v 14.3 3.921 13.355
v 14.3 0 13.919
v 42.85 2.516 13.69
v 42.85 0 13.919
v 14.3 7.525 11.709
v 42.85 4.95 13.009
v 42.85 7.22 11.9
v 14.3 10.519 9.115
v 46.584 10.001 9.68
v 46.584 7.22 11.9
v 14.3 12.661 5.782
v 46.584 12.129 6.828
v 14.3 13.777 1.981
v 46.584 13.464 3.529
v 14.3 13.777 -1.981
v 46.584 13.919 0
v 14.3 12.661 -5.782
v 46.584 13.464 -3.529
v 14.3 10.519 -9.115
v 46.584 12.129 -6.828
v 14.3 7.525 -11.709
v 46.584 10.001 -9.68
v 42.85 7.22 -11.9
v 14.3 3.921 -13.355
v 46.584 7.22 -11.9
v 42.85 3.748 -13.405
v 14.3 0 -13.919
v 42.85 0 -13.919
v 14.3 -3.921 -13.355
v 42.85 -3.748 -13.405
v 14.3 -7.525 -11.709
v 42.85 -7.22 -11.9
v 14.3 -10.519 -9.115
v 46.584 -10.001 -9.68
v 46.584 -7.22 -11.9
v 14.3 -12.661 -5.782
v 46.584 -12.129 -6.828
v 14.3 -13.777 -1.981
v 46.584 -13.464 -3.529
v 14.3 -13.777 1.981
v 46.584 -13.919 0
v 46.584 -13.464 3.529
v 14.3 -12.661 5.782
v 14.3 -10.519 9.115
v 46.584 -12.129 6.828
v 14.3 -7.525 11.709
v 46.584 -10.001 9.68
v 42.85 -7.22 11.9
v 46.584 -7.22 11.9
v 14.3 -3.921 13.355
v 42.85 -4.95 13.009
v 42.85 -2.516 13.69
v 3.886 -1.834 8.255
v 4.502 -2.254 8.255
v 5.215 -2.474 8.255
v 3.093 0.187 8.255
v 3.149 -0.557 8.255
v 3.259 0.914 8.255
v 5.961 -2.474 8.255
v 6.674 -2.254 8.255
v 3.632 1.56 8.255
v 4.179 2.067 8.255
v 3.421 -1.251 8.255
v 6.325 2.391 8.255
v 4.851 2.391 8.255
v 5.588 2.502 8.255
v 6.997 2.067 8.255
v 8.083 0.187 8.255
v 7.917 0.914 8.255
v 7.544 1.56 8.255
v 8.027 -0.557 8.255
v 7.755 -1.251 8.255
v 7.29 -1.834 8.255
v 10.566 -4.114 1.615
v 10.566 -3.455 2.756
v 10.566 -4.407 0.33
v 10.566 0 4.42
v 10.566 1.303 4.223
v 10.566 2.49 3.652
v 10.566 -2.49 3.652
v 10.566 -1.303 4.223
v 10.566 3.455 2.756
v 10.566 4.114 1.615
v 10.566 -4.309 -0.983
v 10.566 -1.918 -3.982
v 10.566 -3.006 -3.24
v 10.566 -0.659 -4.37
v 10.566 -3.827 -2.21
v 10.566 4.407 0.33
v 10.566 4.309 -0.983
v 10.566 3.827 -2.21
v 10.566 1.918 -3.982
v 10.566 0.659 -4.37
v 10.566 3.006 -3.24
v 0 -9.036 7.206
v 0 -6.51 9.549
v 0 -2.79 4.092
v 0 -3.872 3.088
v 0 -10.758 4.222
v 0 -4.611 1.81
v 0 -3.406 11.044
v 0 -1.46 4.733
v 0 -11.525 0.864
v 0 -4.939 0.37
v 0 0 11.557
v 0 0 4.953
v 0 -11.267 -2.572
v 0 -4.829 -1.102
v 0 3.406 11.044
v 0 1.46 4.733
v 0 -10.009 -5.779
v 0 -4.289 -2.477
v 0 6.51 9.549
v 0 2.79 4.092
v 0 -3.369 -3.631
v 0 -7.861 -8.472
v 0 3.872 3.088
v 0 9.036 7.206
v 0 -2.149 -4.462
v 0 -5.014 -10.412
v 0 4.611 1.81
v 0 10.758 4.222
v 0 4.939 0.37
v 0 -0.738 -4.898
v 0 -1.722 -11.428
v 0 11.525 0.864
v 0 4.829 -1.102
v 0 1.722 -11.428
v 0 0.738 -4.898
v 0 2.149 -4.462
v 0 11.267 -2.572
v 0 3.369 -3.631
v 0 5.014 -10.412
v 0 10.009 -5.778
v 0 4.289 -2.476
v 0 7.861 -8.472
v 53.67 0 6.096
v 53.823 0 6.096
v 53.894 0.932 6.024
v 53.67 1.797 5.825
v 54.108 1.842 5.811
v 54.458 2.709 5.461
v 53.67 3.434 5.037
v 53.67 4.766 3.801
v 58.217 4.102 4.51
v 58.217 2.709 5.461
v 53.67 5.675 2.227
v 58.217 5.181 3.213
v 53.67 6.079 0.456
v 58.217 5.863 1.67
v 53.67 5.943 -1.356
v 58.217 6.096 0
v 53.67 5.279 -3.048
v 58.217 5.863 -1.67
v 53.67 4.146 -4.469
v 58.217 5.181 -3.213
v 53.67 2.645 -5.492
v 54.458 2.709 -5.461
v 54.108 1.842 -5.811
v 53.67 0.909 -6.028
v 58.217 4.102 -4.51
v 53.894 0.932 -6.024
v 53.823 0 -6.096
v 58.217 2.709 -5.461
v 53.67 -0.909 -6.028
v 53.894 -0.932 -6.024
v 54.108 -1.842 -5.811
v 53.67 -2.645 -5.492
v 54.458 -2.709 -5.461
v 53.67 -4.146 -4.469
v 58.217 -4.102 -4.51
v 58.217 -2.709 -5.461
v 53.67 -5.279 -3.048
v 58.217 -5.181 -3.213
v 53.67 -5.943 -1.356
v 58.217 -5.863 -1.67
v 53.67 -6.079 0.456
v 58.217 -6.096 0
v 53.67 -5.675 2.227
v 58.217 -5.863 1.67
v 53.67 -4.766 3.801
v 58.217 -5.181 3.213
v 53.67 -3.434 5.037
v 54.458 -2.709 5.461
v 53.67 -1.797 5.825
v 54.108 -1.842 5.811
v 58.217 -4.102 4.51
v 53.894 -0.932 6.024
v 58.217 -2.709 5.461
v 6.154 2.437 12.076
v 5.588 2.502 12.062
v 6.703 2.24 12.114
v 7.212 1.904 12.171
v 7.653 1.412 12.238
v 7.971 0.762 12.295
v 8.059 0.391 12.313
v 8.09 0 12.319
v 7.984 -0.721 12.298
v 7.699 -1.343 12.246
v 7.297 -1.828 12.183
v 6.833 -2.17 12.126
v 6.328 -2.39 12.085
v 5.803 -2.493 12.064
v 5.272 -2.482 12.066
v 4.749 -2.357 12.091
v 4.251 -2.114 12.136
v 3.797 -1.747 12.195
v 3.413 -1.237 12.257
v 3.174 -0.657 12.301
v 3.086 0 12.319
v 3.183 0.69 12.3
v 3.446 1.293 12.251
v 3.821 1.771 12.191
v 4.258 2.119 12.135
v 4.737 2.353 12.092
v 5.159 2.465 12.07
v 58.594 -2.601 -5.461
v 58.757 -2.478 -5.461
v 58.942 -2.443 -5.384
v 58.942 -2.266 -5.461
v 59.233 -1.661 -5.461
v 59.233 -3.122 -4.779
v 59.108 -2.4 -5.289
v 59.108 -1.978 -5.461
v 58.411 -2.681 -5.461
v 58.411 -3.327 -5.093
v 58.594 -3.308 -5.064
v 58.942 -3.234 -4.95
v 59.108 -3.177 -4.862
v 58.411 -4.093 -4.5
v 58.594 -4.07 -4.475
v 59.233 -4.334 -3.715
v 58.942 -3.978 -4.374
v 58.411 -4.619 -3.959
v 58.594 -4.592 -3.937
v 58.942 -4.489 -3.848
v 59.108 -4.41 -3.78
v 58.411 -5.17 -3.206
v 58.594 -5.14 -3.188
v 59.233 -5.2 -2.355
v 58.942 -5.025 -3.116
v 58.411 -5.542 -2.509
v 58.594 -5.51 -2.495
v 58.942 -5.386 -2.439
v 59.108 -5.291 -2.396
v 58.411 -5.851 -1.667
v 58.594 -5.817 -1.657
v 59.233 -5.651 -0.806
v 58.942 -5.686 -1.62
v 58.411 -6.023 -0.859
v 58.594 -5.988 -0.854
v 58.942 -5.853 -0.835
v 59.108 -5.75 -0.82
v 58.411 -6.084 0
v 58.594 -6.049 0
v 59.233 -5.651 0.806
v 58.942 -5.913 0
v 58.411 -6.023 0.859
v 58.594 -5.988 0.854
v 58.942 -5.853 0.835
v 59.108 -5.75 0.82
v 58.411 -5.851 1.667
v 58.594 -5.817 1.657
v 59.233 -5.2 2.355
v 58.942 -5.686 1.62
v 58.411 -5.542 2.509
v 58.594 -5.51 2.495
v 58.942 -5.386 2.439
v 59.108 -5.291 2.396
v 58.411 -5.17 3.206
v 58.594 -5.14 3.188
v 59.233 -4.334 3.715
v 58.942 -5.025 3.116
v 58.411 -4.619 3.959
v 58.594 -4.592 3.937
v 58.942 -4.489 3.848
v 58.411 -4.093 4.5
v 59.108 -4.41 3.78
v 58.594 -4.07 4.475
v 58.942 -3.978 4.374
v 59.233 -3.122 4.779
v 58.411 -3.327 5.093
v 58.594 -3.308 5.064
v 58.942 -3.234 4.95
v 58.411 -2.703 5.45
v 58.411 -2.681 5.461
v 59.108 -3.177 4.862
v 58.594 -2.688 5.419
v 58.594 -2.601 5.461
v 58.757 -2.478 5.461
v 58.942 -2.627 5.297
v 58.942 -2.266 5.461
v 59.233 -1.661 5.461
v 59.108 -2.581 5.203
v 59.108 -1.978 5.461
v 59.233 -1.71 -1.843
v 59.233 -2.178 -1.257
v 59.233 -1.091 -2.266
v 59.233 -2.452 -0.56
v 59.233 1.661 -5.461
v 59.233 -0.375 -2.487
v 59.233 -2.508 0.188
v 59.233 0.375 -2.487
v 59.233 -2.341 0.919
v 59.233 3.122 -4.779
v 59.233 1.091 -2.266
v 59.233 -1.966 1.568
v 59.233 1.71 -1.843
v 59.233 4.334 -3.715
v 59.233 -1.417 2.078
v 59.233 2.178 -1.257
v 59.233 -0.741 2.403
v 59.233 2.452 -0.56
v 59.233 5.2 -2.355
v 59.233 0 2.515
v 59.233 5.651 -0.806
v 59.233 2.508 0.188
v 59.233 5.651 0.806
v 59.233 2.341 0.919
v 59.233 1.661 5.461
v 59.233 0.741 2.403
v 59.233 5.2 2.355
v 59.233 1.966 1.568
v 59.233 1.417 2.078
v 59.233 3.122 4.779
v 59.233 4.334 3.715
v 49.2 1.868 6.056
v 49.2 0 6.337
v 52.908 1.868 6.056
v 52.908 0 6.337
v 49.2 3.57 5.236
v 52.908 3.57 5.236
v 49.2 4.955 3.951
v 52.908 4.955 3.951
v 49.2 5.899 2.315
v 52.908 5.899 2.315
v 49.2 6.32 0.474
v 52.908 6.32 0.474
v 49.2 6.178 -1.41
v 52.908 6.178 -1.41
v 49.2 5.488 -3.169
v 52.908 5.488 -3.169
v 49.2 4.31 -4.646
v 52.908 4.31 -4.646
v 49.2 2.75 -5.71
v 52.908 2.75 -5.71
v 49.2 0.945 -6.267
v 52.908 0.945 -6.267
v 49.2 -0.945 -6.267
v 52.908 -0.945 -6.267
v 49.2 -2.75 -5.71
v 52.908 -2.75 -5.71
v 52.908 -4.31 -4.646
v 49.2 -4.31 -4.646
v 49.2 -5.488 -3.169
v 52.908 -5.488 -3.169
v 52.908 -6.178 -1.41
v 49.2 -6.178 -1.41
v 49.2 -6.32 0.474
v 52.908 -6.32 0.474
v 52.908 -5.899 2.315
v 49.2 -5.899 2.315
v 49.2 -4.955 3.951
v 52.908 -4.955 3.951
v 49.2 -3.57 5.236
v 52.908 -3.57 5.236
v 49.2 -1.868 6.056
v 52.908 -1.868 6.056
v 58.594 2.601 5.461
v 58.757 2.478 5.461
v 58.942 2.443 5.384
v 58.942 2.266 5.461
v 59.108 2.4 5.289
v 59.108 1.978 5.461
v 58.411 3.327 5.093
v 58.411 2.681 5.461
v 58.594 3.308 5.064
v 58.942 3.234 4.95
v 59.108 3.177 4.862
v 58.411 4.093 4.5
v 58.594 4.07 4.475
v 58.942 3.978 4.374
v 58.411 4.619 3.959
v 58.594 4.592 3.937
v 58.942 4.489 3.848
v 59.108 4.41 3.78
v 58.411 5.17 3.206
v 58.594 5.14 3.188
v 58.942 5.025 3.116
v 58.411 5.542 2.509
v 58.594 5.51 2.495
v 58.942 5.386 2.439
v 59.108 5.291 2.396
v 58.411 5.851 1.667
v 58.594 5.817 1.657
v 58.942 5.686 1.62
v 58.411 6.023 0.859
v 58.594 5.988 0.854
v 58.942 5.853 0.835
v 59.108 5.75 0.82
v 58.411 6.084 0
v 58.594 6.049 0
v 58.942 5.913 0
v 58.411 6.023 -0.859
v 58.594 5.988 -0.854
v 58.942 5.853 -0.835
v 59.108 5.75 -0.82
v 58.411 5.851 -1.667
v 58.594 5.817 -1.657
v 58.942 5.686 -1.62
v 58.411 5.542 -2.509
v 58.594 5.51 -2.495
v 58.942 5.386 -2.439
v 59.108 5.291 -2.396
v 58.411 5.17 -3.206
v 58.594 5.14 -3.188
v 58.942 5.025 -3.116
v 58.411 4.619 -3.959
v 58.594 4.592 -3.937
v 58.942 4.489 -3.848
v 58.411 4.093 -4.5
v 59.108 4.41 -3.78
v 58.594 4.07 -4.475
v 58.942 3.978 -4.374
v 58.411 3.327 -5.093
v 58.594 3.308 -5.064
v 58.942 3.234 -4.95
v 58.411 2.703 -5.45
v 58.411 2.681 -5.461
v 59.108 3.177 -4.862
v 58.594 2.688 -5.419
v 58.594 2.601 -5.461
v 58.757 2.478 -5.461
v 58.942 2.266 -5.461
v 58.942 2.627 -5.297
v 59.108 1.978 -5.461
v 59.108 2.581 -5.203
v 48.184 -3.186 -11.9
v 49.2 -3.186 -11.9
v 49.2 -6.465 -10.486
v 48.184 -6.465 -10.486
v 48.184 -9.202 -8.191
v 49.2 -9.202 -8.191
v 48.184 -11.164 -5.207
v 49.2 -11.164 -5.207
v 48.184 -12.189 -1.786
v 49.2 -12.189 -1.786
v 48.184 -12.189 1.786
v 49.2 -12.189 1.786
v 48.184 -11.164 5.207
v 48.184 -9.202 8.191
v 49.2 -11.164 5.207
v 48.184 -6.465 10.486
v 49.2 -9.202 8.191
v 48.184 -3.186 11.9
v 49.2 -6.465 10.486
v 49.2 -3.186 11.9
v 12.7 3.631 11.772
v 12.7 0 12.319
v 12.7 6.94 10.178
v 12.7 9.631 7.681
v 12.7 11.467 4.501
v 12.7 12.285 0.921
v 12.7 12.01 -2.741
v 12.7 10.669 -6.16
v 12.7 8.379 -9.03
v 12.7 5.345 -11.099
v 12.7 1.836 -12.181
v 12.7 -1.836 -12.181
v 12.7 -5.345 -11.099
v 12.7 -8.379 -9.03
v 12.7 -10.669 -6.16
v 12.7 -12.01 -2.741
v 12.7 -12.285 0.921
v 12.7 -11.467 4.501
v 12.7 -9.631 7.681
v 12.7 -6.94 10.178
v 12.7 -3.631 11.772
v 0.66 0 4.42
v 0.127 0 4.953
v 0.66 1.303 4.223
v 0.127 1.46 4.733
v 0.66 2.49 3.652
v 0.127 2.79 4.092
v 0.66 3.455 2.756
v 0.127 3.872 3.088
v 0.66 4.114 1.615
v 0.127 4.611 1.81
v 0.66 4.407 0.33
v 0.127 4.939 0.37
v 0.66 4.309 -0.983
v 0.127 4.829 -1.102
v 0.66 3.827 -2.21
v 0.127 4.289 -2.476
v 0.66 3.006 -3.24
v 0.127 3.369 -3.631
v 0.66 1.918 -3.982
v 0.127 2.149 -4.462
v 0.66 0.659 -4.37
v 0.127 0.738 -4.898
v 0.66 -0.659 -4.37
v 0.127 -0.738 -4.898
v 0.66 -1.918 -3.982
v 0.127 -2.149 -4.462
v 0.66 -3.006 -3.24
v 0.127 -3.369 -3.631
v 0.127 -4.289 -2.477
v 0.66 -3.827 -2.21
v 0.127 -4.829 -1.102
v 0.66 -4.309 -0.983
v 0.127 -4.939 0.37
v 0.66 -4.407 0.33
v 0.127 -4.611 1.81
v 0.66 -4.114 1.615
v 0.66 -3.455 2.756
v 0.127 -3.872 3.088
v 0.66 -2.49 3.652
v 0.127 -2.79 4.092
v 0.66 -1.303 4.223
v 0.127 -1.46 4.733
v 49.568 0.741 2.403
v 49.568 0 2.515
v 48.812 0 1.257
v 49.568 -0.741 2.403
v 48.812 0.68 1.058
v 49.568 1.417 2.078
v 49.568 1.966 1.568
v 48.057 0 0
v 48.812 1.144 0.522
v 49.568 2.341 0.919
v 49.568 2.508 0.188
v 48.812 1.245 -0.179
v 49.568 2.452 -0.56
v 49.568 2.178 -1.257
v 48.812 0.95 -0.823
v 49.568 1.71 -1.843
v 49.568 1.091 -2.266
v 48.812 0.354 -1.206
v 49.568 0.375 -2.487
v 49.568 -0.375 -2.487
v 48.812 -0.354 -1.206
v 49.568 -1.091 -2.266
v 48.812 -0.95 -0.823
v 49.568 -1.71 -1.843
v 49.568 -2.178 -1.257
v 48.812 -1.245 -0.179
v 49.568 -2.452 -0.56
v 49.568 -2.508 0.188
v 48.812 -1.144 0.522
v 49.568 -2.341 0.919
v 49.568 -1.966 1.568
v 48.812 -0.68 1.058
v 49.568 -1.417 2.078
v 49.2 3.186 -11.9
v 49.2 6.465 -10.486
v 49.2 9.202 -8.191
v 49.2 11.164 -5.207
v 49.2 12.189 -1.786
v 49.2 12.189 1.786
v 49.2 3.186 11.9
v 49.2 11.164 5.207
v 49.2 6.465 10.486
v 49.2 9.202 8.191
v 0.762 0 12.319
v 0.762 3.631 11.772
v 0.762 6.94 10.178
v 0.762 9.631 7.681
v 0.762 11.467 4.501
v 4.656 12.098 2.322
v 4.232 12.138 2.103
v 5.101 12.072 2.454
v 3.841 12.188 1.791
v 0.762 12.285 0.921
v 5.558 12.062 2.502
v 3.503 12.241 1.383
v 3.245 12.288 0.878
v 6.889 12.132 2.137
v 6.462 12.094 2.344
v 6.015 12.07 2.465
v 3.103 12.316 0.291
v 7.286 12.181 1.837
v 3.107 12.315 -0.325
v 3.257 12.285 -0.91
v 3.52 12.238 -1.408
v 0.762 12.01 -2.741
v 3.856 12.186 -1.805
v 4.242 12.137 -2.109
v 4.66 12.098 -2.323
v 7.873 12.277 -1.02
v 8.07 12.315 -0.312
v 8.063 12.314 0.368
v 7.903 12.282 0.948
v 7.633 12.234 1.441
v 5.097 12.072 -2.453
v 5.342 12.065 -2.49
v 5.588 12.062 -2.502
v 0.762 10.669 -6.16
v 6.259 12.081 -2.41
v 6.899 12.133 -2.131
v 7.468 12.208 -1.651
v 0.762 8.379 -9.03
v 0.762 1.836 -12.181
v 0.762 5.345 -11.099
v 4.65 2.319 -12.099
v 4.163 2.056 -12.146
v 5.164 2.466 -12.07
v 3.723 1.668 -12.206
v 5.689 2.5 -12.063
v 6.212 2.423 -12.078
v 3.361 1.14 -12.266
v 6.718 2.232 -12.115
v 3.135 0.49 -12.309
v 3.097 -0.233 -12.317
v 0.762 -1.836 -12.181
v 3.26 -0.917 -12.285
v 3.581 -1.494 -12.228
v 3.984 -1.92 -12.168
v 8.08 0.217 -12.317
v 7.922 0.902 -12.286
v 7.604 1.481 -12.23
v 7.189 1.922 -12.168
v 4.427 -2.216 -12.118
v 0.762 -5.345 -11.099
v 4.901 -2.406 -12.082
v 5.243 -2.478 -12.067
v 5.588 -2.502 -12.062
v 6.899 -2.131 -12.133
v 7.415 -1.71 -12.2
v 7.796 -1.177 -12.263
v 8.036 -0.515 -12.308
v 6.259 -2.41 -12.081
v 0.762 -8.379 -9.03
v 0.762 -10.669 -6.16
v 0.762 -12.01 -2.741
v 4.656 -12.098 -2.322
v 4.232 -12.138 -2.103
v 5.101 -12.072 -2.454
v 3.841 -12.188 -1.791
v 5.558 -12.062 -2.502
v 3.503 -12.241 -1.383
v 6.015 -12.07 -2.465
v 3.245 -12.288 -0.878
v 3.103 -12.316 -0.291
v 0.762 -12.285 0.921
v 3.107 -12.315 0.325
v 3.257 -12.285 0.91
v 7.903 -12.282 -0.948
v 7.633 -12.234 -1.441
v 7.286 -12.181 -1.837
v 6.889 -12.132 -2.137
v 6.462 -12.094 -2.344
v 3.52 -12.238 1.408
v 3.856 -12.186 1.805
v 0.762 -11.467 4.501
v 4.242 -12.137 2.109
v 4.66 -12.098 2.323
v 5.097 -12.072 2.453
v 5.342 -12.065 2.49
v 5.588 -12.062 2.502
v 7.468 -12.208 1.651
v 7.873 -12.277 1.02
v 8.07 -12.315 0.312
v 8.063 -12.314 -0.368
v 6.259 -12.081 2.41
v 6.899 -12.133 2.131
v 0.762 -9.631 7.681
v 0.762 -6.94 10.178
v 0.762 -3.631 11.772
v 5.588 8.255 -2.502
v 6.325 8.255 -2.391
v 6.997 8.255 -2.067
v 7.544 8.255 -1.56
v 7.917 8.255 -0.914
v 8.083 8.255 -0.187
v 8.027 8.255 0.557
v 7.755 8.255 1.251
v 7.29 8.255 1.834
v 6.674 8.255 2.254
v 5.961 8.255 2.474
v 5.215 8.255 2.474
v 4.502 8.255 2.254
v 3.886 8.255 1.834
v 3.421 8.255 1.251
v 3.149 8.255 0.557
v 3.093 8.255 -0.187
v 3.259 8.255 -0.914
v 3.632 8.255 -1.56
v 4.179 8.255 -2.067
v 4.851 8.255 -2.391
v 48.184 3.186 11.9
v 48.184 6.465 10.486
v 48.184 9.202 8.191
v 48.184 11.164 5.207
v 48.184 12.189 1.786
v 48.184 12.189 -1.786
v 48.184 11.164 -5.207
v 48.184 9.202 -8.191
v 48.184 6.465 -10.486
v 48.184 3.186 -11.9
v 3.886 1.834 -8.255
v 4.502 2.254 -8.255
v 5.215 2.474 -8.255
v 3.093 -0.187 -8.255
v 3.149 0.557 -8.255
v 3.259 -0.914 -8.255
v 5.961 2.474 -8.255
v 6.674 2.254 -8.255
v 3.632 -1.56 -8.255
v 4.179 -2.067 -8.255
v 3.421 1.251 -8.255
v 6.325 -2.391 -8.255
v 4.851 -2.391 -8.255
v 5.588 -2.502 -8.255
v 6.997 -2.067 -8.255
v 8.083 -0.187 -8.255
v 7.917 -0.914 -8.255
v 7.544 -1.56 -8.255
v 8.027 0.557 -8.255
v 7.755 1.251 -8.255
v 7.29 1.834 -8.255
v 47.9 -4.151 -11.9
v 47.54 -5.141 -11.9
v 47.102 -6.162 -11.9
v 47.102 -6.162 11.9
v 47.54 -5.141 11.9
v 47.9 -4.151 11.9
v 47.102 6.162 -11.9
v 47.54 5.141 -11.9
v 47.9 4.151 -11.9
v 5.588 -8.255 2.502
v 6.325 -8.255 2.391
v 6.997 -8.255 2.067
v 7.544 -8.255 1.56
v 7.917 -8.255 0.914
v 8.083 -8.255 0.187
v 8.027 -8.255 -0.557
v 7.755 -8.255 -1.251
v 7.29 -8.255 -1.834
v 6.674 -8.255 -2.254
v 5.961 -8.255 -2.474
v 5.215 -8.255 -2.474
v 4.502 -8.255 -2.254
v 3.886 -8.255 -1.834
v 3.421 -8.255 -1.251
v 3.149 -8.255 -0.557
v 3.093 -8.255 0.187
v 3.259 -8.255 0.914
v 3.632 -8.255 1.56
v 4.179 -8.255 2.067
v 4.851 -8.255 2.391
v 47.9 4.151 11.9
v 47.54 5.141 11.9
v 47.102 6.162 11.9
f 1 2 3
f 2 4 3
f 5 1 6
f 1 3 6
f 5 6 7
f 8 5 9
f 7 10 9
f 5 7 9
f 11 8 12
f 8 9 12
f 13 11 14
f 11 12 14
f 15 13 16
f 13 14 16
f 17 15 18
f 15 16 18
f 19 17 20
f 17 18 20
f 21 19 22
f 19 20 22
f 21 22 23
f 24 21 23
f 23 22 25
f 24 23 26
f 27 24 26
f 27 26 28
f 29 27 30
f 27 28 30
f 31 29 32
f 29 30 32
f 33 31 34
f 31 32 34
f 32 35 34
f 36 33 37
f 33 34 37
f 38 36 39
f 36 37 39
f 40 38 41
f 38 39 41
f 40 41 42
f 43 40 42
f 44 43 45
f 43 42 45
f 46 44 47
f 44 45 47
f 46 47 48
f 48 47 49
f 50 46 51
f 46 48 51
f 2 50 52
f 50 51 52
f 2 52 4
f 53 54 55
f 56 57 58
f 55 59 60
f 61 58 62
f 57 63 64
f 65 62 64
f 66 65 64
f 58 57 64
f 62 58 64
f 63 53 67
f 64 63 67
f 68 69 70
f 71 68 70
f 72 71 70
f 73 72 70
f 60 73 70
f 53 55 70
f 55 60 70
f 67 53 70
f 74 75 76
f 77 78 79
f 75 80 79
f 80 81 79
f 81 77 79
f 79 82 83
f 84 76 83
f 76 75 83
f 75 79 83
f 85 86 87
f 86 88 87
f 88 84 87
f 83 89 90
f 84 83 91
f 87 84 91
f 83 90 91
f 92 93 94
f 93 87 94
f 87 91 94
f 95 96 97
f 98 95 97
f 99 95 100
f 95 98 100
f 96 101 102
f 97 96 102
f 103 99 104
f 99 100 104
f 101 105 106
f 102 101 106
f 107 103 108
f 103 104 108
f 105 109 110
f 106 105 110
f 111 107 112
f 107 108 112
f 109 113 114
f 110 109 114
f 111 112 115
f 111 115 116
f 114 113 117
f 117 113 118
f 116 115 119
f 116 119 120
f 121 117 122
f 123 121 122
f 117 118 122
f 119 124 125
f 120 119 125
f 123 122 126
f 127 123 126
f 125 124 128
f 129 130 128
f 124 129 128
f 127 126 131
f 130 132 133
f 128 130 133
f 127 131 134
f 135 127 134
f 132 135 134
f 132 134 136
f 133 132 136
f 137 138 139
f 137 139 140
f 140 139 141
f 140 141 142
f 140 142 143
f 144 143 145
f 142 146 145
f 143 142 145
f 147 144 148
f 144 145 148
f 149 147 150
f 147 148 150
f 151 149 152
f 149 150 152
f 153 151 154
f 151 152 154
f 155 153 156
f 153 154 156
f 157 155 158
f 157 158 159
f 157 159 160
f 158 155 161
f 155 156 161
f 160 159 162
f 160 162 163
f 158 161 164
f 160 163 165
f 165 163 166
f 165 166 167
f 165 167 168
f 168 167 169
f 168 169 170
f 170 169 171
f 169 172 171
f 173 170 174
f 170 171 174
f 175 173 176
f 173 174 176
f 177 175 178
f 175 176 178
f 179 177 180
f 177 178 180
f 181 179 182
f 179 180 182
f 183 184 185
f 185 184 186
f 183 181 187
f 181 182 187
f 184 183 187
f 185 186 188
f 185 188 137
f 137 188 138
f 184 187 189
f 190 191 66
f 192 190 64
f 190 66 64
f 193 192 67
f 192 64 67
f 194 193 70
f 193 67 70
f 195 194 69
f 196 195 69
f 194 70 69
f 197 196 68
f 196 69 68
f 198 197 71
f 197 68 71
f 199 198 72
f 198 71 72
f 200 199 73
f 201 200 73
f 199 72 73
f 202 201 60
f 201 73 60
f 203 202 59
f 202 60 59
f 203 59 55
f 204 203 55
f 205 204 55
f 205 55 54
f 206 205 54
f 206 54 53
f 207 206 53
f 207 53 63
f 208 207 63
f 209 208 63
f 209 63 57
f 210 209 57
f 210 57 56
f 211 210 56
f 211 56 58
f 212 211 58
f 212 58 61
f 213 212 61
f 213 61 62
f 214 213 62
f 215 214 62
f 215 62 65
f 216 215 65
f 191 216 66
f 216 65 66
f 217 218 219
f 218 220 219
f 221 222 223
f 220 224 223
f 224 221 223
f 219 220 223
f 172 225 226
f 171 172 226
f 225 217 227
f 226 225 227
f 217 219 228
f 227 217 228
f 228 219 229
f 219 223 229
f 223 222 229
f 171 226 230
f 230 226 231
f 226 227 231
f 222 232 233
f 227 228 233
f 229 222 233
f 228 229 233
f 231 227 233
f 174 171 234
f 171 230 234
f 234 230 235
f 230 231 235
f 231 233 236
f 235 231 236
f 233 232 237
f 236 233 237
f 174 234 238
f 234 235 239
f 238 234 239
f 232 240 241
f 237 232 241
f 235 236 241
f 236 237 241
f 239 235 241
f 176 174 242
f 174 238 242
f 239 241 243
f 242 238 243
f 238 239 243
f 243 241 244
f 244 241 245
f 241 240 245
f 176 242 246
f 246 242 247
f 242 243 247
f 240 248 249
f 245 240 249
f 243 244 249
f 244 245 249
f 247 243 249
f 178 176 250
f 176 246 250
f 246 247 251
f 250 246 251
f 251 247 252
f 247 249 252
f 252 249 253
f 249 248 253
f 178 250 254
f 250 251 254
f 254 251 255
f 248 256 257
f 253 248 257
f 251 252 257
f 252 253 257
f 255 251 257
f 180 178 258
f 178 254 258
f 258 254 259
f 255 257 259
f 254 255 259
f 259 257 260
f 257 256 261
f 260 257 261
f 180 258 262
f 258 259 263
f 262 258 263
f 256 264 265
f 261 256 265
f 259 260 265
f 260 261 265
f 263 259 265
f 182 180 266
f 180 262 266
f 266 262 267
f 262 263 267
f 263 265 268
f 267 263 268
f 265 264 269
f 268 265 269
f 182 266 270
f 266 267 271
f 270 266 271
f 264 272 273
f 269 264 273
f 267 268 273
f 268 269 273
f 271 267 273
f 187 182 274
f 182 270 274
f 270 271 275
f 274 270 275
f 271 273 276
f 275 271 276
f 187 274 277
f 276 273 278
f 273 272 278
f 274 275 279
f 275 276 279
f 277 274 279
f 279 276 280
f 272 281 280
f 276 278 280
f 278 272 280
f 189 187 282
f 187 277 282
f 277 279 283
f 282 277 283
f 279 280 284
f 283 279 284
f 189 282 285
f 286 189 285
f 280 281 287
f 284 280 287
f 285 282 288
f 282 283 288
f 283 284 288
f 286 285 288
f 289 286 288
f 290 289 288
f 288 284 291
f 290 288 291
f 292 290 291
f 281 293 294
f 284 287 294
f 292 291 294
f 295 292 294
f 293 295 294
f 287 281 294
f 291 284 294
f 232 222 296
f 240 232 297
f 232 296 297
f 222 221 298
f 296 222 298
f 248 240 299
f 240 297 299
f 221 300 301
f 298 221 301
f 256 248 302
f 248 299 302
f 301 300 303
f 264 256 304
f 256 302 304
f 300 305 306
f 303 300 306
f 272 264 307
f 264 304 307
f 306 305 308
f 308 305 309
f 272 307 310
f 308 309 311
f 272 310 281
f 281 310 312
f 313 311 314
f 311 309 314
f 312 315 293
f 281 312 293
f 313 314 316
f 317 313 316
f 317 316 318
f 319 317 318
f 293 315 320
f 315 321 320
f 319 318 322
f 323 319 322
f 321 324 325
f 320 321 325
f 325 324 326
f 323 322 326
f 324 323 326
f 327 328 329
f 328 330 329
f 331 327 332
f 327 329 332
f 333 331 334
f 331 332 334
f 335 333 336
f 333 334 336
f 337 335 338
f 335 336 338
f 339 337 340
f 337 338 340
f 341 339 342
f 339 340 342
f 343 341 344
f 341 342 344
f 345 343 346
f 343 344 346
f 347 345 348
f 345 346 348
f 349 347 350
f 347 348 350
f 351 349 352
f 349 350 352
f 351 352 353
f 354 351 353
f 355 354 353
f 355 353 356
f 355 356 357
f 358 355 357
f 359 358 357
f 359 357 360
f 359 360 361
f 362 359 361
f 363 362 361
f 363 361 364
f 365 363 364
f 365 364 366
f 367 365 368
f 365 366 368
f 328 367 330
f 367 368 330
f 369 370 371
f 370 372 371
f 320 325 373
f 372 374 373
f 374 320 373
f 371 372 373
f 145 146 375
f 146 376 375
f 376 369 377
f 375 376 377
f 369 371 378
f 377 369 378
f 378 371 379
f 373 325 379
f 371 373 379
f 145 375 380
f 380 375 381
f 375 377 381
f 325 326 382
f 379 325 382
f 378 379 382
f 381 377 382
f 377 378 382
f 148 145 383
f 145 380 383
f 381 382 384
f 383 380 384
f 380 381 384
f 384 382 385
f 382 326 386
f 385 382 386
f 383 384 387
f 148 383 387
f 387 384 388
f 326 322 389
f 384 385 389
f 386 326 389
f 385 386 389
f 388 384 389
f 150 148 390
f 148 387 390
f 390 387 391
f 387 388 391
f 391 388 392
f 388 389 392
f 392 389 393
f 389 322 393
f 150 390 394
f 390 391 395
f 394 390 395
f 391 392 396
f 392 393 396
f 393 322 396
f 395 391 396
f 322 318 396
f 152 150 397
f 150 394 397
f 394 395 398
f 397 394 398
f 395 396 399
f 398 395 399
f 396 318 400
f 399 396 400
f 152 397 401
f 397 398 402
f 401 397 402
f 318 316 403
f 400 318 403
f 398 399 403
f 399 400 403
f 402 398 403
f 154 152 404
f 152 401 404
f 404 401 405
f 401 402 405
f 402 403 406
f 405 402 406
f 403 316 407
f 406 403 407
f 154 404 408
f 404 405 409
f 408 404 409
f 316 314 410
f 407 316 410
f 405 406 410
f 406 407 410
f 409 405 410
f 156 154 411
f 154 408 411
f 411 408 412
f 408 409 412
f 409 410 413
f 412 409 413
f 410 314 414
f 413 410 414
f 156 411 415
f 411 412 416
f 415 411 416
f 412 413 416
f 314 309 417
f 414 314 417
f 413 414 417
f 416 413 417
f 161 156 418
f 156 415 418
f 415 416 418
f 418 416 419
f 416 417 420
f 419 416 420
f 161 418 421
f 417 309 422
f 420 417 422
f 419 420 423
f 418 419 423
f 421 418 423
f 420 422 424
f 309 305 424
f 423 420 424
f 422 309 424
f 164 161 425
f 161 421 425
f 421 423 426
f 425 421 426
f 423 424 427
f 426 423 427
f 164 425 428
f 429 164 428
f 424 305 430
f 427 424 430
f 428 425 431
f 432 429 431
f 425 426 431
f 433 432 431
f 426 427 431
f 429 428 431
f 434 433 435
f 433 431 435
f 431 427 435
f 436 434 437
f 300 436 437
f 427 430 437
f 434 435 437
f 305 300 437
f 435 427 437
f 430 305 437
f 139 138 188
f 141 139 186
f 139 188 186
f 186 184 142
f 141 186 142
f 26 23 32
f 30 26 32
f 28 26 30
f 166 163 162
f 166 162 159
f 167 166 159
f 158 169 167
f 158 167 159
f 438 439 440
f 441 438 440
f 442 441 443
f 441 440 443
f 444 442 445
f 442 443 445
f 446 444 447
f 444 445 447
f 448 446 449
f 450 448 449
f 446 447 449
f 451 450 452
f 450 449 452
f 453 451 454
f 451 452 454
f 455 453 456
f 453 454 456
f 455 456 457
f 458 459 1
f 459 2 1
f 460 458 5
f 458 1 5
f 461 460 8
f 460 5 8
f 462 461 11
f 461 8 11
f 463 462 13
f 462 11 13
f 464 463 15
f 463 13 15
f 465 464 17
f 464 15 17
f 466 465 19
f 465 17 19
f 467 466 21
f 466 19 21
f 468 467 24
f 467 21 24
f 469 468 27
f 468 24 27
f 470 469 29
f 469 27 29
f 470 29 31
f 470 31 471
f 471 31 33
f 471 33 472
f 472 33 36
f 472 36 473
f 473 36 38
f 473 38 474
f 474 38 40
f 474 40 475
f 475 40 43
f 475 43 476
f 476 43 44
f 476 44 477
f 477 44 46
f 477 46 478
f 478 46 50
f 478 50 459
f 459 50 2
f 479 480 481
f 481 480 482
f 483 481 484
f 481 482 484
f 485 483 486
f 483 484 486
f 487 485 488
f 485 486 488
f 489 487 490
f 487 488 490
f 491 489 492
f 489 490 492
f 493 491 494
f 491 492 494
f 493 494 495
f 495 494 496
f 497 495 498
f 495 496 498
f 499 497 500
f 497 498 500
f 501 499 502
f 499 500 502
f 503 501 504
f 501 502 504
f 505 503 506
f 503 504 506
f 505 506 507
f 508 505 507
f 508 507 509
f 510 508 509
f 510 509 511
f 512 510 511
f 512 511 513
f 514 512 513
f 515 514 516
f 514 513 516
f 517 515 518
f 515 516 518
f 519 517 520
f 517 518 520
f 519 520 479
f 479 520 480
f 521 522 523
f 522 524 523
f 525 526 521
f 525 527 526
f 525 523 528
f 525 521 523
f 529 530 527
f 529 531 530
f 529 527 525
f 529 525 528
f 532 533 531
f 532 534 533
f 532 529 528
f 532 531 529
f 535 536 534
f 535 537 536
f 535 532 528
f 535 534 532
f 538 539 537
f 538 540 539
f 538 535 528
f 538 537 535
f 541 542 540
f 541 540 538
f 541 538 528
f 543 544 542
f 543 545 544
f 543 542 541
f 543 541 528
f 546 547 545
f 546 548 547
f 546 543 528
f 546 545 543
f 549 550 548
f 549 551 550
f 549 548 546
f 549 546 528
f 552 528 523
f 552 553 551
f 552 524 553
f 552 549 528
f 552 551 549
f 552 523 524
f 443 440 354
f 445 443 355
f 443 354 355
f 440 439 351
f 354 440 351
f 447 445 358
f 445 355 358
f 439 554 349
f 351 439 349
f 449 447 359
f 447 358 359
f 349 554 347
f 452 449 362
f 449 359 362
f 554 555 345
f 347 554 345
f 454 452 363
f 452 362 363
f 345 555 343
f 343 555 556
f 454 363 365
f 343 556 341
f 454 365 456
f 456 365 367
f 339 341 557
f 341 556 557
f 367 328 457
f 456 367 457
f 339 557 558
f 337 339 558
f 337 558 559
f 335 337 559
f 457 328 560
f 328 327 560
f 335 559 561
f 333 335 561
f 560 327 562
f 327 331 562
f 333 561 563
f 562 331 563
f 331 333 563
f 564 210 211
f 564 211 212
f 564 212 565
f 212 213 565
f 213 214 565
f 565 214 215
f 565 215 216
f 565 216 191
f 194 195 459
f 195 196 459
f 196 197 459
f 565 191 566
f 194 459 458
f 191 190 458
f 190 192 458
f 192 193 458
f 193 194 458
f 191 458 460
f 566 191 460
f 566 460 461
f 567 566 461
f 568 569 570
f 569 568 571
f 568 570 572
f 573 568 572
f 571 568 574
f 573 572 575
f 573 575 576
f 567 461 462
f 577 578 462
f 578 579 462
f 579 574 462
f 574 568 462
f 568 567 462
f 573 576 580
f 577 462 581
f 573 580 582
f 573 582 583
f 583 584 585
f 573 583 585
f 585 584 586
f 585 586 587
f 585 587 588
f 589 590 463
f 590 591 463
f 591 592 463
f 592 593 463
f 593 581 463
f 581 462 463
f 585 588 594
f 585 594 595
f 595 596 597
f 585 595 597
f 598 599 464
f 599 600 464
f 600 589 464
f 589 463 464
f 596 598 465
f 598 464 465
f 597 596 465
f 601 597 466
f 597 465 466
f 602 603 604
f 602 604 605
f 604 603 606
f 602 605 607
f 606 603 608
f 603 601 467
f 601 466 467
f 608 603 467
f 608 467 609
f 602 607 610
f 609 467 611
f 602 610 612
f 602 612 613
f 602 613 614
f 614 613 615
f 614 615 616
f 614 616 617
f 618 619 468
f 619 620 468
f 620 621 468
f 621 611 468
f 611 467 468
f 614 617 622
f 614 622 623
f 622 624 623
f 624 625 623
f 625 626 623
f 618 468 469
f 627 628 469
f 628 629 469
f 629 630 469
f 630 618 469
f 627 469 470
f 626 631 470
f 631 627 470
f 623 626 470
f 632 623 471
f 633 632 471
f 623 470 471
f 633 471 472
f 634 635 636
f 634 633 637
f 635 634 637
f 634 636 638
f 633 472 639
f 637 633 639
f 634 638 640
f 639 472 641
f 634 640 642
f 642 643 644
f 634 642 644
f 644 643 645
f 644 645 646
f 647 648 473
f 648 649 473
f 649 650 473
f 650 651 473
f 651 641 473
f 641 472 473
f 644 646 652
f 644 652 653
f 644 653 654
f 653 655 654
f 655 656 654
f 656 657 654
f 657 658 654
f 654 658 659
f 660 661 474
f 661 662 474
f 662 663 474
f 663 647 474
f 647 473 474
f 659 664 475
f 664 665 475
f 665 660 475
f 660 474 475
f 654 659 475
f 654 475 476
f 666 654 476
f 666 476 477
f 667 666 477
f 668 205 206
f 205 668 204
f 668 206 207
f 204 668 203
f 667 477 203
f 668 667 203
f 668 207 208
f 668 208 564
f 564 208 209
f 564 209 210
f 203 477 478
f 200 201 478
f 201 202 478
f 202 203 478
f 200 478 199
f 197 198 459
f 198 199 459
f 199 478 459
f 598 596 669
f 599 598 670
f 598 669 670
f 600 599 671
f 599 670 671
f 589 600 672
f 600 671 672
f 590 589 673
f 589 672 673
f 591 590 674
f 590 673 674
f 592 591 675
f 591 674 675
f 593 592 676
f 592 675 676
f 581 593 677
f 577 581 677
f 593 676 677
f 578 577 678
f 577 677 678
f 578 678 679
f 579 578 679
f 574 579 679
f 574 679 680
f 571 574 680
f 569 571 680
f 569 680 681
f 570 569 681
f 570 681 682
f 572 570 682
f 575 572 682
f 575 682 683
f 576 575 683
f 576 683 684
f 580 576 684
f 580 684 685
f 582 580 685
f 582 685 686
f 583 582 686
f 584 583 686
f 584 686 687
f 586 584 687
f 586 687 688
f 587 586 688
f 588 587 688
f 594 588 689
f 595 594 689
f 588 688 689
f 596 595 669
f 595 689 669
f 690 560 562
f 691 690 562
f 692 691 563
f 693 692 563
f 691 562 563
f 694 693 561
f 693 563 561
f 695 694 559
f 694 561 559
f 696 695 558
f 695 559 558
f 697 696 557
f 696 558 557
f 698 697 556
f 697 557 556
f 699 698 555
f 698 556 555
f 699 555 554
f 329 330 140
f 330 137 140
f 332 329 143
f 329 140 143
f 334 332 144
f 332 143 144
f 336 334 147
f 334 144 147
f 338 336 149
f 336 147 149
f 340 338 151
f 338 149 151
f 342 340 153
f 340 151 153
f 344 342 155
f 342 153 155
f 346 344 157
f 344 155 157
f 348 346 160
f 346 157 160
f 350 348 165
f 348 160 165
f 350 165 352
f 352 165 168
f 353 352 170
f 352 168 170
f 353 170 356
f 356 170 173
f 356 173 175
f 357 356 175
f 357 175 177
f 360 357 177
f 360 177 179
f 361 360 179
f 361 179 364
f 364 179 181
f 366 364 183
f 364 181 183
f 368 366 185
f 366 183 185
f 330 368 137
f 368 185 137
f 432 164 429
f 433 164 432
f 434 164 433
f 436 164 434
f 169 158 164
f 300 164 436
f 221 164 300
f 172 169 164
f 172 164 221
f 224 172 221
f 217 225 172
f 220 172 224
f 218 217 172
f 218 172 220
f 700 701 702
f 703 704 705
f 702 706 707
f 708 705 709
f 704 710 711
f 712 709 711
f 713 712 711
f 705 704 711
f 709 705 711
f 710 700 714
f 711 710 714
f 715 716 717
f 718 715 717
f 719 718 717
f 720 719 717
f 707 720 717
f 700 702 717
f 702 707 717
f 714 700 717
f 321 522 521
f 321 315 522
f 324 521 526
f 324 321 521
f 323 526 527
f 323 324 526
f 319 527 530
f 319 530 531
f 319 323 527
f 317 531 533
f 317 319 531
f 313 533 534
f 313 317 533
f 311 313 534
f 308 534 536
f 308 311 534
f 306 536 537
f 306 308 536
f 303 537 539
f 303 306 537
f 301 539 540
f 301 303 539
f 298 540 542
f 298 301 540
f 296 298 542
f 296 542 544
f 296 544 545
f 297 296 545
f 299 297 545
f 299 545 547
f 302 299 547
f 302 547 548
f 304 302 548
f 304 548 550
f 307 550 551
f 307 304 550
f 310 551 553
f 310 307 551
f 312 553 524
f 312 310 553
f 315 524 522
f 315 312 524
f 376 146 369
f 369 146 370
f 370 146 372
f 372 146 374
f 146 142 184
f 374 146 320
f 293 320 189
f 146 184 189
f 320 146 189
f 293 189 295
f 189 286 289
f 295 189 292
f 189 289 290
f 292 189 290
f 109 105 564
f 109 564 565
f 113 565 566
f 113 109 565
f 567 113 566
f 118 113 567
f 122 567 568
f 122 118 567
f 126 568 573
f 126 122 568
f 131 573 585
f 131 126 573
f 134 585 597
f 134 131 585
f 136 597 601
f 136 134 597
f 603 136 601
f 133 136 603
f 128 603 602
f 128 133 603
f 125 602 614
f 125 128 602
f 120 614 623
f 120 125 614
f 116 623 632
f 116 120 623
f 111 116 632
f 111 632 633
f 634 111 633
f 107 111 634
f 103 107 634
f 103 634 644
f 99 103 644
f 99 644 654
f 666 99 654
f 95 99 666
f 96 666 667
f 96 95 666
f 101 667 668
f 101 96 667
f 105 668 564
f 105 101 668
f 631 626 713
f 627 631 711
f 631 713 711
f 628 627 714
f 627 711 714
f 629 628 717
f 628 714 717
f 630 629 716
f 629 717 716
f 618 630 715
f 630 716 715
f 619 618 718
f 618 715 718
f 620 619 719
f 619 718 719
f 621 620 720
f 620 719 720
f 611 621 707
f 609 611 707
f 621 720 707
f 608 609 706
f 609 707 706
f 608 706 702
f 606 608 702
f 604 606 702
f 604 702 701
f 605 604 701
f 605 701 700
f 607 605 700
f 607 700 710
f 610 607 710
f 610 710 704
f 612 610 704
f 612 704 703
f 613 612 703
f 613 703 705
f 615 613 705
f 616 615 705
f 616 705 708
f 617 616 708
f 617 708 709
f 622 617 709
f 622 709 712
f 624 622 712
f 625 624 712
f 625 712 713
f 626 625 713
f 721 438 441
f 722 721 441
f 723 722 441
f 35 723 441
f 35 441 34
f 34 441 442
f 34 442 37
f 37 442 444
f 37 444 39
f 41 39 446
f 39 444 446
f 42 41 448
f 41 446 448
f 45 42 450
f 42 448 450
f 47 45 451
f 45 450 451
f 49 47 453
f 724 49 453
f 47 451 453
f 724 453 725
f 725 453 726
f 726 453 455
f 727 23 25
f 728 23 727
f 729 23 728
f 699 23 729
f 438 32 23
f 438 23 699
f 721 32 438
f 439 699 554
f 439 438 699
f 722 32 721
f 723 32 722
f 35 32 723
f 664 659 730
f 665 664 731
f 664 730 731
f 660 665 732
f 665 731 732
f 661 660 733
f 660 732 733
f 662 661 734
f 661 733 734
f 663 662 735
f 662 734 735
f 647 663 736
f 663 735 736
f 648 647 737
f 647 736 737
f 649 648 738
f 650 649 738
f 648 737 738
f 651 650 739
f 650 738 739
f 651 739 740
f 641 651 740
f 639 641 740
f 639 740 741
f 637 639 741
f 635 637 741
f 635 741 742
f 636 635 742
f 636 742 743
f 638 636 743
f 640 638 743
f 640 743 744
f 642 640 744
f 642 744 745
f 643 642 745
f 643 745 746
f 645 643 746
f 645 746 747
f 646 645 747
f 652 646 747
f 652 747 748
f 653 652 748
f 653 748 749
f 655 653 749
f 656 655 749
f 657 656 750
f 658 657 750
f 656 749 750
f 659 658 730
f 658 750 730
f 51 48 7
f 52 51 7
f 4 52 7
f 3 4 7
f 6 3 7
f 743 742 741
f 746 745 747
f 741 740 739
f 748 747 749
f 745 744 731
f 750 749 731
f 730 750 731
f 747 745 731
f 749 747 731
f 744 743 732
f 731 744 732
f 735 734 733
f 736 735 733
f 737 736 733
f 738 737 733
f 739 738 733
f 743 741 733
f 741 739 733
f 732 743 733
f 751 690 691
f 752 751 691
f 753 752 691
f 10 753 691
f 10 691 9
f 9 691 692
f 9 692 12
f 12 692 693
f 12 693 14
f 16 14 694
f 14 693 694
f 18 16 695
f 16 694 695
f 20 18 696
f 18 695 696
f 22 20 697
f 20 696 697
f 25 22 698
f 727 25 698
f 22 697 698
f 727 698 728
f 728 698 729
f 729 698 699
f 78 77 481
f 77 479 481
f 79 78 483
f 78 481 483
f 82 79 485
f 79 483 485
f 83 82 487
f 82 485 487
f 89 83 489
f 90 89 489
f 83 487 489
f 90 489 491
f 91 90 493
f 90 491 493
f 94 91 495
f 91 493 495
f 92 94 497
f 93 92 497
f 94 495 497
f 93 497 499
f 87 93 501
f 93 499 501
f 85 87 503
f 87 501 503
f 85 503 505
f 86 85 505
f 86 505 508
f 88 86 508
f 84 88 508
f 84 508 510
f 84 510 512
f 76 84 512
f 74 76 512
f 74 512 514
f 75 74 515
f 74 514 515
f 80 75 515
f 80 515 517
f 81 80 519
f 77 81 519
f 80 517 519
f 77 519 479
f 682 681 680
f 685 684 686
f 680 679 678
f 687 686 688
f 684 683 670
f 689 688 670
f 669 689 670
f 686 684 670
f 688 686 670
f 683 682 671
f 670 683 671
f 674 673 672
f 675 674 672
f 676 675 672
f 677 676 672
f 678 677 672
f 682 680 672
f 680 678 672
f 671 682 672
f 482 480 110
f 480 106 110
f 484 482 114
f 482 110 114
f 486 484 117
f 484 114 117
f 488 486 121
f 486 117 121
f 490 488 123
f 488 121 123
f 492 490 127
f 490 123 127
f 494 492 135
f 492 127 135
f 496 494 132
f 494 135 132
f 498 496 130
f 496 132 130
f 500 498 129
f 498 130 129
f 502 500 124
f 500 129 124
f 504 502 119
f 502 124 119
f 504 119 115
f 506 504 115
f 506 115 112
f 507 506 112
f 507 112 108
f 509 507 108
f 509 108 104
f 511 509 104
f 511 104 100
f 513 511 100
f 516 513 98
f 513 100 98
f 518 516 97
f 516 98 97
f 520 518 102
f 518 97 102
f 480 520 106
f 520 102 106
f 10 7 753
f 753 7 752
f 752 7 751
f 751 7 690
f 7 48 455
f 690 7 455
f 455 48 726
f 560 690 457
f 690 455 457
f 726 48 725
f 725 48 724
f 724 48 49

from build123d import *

# Parameters (mm, degrees)
CHAMFER1_SIZE           = 0.762
CUT_EXTRUDE1_DEPTH      = 14.919
CUT_EXTRUDE1_DEPTH_BACK = 14.919
HOLE1_D                 = 5.0038
HOLE1_DEPTH             = 4.064
CIRPATTERN1_COUNT       = 4
SKETCH6_W               = 6.35
SKETCH6_H               = 2.019
CUT_EXTRUDE2_DEPTH      = 14.919
CUT_EXTRUDE2_DEPTH_BACK = 14.919


with BuildPart() as part:
    # Sketch1 → Revolve1 (revolve)
    with BuildSketch(Plane(origin=(0, 0, 0), x_dir=(-1, 0, 0), z_dir=(0, 0, -1)), mode=Mode.PRIVATE) as revolve1_sk:
        with BuildLine():
            Line((-59.2328, 5.707922533), (-59.2328, 0))
            Line((-59.2328, 0), (0, 0))
            Line((0, 0), (0, 12.319))
            Line((0, 12.319), (-12.7, 12.319))
            Line((-12.7, 12.319), (-14.3, 13.919))
            Line((-14.3, 13.919), (-46.5838, 13.919))
            Line((-46.5838, 13.919), (-48.1838, 12.319))
            Line((-48.1838, 12.319), (-49.1998, 12.319))
            Line((-49.1998, 12.319), (-49.1998, 6.3373))
            Line((-49.1998, 6.3373), (-52.9082, 6.3373))
            Line((-52.9082, 6.3373), (-53.6702, 6.096))
            Line((-53.6702, 6.096), (-58.2168, 6.096))
            ThreePointArc((-58.2168, 6.096), (-58.760596865, 5.995678675), (-59.2328, 5.707922533))
        make_face()
    revolve(revolve1_sk.sketch.rotate(Axis((59.2328, 0, 0), (-1, 0, 0)), 270), axis=Axis((59.2328, 0, 0), (-1, 0, 0)))  # turned: the seam where the file's is

    # Sketch2 → Cut-Revolve1 (revolve, cut)
    with BuildSketch(Plane(origin=(0, 0, 0), x_dir=(-1, 0, 0), z_dir=(0, 0, -1)), mode=Mode.PRIVATE) as cut_revolve1_sk:
        Polygon((-10.5664, 0), (-10.5664, 4.4196), (-0.6604, 4.4196), (-0.127, 4.953), (0, 4.953), (0, 0), align=None)
    revolve(cut_revolve1_sk.sketch.rotate(Axis((33.143328407, 0, 0), (-1, 0, 0)), 270), axis=Axis((33.143328407, 0, 0), (-1, 0, 0)), mode=Mode.SUBTRACT)  # turned: the seam where the file's is

    # Sketch3 → Cut-Revolve2 (revolve, cut)
    with BuildSketch(Plane(origin=(0, 0, 0), x_dir=(-1, 0, 0), z_dir=(0, 0, -1)), mode=Mode.PRIVATE) as cut_revolve2_sk:
        Polygon((-59.2328, 2.5146), (-59.2328, 0), (-48.0568, 0), (-49.567724113, 2.5146), align=None)
    revolve(cut_revolve2_sk.sketch.rotate(Axis((66.313858967, 0, 0), (-1, 0, 0)), 270), axis=Axis((66.313858967, 0, 0), (-1, 0, 0)), mode=Mode.SUBTRACT)  # turned: the seam where the file's is

    # Chamfer1
    chamfer1_edges = [part.edges().sort_by_distance(p)[0] for p in [
        (0, 0, -12.319),
    ]]
    chamfer(chamfer1_edges, length=CHAMFER1_SIZE)

    # Sketch4 → Cut-Extrude1 (cut, two sides)
    with BuildSketch(Plane(origin=(0, 0, 0), x_dir=(1, 0, 0), z_dir=(0, 1, 0))) as cut_extrude1_sk:
        Polygon((53.8226, 6.096), (54.4576, 5.461), (59.2328, 5.461), (59.2328, 6.096), align=None)
        Polygon((59.2328, -6.096), (53.8226, -6.096), (54.4576, -5.461), (59.2328, -5.461), align=None)
    extrude(amount=CUT_EXTRUDE1_DEPTH, mode=Mode.SUBTRACT)
    extrude(cut_extrude1_sk.sketch, amount=-CUT_EXTRUDE1_DEPTH_BACK, mode=Mode.SUBTRACT)

    # Hole1
    with Locations(Plane(origin=(5.588, 12.319, 0), x_dir=(0, 0, 1), z_dir=(0, 1, 0))):
        with Locations((0, 0)):
            hole1 = Hole(HOLE1_D / 2, depth=HOLE1_DEPTH)

    # CirPattern1: Hole1 ×4 about axis
    cirpattern1_axis = Axis((0, 0, 0), (1, 0, 0))
    for i in range(1, CIRPATTERN1_COUNT):
        add(hole1.rotate(cirpattern1_axis, i * 360 / CIRPATTERN1_COUNT), mode=Mode.SUBTRACT)

    # Sketch6 → Cut-Extrude2 (cut, two sides)
    with BuildSketch(Plane(origin=(0, 0, 0), x_dir=(1, 0, 0), z_dir=(0, 1, 0))) as cut_extrude2_sk:
        with Locations((46.0248, 12.9095)):
            Rectangle(SKETCH6_W, SKETCH6_H)
        with Locations((46.0248, -12.9095)):
            Rectangle(SKETCH6_W, SKETCH6_H)
    extrude(amount=CUT_EXTRUDE2_DEPTH, mode=Mode.SUBTRACT)
    extrude(cut_extrude2_sk.sketch, amount=-CUT_EXTRUDE2_DEPTH_BACK, mode=Mode.SUBTRACT)


solid = part.part
